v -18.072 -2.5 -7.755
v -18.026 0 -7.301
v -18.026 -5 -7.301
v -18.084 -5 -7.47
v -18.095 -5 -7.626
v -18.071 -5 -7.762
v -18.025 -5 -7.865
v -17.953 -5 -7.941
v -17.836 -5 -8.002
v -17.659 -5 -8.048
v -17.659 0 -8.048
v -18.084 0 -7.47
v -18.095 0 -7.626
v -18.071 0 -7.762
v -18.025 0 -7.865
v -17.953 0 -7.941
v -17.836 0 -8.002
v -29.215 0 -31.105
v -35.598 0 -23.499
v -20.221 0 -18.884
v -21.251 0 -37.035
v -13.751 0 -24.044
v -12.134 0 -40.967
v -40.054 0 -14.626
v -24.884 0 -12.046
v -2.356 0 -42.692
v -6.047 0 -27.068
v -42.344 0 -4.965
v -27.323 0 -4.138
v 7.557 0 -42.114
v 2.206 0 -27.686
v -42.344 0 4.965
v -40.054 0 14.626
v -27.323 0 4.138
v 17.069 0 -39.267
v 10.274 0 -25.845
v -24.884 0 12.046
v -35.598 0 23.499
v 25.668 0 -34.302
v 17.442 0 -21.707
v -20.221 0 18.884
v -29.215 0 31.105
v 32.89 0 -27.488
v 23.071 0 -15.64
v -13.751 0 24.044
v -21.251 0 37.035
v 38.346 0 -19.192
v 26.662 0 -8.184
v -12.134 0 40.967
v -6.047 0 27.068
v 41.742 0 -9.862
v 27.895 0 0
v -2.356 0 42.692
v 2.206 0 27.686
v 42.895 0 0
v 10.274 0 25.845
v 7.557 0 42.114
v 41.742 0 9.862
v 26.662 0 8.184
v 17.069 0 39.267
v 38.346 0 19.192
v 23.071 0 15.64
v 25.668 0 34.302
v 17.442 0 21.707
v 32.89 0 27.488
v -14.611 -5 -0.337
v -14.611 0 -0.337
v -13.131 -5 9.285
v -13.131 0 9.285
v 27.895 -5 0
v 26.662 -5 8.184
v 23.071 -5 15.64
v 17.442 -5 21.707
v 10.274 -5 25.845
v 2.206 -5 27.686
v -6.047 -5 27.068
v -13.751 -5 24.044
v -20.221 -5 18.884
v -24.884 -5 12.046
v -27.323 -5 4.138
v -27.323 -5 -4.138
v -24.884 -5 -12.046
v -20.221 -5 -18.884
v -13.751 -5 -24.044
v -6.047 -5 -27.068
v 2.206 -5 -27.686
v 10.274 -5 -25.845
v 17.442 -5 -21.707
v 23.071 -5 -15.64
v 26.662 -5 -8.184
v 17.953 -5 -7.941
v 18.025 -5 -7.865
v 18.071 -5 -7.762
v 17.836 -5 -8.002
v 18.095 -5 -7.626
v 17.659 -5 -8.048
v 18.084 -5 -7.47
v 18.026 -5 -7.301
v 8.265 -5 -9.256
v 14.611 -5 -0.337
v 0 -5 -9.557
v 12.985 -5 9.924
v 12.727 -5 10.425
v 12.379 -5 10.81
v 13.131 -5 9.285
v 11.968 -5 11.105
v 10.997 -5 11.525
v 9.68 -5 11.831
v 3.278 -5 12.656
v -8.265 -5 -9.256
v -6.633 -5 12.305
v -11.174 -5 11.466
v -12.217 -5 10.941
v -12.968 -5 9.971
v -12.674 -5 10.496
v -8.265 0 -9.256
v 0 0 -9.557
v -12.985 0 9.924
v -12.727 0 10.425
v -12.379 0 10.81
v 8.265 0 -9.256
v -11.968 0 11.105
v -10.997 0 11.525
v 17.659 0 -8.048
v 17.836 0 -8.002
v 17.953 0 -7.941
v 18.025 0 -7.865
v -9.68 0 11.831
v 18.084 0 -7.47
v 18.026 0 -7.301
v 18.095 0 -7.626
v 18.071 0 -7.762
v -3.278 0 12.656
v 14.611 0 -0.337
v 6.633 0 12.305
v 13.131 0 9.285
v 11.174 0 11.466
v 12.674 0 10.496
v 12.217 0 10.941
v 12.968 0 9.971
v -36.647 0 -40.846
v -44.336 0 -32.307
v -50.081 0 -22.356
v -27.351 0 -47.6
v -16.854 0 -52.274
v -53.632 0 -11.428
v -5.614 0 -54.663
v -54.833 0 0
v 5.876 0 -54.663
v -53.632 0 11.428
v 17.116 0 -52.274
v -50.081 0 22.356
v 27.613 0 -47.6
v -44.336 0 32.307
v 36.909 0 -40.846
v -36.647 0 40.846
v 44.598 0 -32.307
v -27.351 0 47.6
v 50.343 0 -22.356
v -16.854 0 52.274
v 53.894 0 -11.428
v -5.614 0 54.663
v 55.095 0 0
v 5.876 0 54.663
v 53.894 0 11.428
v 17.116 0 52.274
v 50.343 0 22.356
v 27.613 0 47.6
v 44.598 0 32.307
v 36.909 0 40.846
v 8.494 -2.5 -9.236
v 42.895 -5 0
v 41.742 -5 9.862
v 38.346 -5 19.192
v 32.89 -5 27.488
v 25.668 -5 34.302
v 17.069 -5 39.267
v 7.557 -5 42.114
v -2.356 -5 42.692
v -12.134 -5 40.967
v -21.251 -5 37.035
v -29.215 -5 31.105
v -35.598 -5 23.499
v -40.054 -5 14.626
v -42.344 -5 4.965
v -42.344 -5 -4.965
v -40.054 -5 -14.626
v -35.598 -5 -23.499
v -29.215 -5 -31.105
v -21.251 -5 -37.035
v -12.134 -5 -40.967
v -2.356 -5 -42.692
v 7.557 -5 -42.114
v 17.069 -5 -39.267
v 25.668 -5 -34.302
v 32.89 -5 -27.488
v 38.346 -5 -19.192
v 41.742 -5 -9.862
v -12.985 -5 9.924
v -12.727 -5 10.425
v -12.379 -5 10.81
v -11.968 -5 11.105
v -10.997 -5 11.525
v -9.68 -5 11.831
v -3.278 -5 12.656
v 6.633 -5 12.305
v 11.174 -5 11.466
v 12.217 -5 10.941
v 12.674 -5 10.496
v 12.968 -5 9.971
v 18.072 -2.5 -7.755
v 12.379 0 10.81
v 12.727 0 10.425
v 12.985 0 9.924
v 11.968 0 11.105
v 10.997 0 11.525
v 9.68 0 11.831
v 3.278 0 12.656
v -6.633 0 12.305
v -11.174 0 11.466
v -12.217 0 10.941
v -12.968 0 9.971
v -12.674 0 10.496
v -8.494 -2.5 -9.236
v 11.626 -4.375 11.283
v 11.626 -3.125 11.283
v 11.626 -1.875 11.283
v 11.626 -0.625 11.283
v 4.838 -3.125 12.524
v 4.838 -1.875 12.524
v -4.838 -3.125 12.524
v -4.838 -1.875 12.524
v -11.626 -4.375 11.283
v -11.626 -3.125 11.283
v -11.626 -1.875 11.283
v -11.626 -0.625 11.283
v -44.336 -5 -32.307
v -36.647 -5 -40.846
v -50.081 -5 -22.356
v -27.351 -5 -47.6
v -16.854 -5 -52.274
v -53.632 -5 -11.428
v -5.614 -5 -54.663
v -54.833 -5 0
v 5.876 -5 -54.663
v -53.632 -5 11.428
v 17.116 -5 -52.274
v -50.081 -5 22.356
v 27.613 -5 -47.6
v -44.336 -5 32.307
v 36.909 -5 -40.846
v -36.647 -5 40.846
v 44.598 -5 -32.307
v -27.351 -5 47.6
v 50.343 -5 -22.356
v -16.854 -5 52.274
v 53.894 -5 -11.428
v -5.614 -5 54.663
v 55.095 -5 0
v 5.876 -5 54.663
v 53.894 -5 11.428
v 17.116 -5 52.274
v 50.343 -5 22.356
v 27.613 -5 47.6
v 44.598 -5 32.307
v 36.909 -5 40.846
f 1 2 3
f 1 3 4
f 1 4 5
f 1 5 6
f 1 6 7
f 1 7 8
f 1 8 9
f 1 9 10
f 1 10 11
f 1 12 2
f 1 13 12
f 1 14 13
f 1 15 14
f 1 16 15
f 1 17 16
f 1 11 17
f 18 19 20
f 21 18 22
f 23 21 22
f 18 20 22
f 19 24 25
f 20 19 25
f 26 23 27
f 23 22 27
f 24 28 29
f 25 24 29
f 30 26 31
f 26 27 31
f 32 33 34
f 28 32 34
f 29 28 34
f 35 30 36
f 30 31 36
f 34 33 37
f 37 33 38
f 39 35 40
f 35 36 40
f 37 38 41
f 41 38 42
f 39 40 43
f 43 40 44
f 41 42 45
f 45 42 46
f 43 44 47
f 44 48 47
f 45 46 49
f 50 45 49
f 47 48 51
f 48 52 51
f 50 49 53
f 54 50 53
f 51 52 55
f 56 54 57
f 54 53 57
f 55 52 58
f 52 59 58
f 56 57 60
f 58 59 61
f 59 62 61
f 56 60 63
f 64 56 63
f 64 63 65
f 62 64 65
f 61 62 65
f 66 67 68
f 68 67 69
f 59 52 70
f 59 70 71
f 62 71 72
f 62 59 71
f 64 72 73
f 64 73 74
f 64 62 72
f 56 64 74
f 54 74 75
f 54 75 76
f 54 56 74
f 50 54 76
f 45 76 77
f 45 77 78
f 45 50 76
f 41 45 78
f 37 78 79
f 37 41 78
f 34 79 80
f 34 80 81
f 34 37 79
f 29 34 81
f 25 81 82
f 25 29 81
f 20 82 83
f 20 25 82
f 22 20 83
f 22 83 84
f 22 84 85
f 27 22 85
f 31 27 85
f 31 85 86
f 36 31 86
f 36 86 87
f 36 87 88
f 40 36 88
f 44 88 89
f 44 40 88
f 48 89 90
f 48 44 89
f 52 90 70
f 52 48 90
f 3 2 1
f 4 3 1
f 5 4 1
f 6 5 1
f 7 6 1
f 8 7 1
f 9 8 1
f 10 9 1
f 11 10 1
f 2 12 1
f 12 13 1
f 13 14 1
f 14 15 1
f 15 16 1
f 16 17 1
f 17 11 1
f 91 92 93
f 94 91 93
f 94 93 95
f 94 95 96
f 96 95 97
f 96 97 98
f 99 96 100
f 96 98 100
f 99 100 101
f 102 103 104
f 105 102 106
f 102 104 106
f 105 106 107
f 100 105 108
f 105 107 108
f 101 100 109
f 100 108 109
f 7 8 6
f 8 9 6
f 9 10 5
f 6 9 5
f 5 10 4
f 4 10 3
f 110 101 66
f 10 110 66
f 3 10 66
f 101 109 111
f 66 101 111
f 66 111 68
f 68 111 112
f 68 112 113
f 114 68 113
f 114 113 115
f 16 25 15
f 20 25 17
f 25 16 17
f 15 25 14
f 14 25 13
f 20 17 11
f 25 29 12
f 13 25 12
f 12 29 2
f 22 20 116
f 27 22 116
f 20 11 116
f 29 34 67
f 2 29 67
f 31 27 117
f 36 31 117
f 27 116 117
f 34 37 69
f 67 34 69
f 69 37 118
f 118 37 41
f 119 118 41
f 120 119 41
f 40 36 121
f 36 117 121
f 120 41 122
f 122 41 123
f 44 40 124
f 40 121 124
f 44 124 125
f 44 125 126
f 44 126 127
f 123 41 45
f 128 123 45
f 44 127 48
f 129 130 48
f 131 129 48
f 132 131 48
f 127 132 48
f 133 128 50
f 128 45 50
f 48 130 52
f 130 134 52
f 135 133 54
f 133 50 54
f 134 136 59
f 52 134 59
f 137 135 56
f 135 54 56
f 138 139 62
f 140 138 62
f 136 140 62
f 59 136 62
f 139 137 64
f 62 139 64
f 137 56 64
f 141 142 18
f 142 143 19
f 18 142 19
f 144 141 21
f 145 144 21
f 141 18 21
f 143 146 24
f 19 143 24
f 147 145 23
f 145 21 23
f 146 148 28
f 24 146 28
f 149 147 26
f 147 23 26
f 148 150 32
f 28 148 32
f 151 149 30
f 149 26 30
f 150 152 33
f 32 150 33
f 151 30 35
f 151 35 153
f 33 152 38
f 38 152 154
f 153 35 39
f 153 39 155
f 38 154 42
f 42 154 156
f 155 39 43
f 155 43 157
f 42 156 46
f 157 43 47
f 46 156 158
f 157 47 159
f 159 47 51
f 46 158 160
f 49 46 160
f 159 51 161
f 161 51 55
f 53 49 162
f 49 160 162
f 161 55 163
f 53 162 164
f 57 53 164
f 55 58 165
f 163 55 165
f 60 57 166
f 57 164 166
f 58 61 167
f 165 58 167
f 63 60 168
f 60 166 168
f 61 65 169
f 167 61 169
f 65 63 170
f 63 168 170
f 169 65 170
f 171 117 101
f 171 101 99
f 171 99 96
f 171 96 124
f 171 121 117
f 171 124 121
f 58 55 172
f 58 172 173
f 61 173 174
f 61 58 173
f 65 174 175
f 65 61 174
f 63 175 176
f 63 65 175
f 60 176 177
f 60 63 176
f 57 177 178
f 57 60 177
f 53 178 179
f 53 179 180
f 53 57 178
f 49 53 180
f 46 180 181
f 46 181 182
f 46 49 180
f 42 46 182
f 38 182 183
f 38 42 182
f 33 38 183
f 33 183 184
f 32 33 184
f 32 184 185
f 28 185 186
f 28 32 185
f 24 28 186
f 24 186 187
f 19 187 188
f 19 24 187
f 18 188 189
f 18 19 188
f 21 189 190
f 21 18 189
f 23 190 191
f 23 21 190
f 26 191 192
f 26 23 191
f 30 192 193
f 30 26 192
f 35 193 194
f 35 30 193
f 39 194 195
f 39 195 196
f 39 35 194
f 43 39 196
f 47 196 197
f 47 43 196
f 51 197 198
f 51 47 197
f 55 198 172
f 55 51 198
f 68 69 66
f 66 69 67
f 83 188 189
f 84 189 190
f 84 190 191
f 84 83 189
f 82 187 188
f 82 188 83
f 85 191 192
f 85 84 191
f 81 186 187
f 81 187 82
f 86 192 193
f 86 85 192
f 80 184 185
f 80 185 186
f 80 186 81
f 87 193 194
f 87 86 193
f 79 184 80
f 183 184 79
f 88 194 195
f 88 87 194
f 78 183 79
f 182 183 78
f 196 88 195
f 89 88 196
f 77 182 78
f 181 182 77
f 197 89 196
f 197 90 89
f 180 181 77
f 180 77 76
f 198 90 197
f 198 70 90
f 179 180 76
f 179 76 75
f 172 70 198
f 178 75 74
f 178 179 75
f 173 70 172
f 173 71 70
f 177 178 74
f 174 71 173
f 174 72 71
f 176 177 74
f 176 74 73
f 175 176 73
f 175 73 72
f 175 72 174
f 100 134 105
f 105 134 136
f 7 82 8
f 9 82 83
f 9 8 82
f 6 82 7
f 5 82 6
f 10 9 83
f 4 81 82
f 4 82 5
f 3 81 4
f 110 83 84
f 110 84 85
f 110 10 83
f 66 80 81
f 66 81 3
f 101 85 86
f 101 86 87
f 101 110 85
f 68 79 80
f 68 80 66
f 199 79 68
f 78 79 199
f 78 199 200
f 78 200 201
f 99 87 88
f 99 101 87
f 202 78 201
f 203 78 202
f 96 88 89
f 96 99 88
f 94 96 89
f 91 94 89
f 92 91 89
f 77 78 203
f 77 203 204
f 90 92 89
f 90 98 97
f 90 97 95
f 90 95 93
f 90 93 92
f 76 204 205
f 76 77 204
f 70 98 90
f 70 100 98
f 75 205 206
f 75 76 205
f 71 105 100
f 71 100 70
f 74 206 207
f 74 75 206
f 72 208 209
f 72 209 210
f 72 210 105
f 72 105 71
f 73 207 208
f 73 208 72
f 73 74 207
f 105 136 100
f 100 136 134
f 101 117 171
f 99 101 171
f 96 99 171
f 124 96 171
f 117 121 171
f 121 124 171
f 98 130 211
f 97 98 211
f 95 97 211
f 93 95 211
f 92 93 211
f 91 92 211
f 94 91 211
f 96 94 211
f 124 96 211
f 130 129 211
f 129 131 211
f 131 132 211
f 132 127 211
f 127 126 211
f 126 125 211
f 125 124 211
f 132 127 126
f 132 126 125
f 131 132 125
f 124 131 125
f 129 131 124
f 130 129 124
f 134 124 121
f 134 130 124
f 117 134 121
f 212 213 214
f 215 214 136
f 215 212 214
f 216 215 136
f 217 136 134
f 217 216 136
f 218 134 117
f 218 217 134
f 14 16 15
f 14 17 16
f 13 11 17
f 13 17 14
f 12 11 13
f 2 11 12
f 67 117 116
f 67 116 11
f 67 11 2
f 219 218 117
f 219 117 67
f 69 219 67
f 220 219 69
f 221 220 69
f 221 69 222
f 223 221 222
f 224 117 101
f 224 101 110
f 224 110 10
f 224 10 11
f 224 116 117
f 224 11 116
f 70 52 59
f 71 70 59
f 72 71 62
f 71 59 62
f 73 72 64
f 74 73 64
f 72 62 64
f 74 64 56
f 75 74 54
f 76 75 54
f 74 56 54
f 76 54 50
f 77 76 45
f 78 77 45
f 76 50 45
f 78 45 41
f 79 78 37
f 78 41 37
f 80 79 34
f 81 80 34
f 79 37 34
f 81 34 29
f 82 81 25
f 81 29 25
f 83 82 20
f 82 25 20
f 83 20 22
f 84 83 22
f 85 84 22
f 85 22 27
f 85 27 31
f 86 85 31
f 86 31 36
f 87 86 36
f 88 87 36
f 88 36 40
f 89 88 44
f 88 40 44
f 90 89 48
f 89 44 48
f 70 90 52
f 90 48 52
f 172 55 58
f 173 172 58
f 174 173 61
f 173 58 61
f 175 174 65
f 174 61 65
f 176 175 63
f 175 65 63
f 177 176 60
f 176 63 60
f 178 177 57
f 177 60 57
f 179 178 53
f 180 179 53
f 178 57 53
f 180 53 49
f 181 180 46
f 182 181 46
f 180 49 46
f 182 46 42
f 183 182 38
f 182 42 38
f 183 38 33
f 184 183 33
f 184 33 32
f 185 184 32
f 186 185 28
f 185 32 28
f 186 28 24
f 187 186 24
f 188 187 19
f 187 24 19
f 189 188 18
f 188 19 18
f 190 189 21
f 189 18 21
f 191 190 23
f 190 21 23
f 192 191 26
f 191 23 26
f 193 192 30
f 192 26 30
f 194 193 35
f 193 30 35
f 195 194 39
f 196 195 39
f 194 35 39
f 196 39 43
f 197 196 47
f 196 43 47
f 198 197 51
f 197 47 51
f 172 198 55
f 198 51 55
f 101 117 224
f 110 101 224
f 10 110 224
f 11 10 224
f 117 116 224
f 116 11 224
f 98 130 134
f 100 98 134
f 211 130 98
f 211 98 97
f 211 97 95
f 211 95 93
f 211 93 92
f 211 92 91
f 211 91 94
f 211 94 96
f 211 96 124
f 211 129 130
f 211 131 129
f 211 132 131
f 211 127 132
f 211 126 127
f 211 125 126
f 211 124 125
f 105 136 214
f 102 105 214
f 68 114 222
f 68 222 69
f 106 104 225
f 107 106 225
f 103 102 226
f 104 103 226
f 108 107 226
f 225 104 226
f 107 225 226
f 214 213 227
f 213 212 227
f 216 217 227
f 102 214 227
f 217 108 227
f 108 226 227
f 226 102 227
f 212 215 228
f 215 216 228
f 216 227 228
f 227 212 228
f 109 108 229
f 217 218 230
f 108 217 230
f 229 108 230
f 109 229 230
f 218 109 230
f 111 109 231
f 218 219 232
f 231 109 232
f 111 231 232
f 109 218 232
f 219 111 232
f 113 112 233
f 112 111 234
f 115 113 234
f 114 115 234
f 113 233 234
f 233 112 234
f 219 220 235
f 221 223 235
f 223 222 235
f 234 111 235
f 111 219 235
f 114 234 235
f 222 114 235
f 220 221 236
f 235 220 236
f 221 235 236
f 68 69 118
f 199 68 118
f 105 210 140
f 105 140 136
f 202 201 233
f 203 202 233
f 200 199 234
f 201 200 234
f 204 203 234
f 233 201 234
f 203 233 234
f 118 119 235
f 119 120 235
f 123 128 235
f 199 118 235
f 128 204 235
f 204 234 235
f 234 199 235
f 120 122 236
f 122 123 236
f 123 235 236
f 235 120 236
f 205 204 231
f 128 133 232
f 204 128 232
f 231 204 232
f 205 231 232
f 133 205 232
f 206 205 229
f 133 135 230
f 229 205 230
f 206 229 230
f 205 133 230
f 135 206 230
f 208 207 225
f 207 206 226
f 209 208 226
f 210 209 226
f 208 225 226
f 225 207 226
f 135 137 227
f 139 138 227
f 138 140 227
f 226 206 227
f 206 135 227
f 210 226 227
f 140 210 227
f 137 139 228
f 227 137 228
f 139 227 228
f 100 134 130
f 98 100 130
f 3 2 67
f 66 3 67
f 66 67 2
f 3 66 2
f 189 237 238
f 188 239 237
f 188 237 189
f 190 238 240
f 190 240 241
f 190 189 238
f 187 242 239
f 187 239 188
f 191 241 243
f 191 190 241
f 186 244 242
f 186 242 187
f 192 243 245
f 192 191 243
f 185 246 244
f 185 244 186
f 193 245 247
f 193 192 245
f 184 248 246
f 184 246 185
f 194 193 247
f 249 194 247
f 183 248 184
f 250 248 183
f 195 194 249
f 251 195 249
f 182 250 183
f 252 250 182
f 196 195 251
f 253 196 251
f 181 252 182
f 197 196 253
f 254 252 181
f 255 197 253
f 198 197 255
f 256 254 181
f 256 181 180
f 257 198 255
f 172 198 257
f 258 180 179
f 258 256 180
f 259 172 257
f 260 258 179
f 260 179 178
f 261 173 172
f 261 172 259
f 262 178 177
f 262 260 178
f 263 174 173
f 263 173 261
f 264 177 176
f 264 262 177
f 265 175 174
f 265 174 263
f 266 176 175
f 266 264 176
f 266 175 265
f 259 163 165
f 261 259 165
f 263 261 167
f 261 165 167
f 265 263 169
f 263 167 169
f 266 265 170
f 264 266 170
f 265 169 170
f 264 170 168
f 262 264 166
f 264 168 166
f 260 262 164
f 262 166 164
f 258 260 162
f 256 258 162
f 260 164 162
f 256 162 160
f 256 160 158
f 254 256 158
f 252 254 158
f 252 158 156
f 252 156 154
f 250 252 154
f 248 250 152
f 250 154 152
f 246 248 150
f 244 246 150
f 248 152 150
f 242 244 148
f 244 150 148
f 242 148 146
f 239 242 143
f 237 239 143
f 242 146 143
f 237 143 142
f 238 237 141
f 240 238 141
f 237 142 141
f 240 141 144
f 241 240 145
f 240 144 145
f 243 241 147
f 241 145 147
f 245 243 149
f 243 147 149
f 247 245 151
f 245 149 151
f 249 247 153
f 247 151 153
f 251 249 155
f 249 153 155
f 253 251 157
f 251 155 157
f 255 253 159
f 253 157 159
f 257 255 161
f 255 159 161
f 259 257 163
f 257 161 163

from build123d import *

# Parameters (mm, degrees)
F1_DEPTH = 5
F0_R     = 27.763995
F2_DEPTH = 5
F0_R_2   = 42.763995
F3_DEPTH = 5
F0_R_3   = 54.963995
F4_DEPTH = 5


with BuildPart() as f1:
    # F0 (on Front) → F1 (new body)
    with BuildSketch(Plane.XZ):
        with BuildLine():
            add(Edge.make_bspline(
                [(0, 12.749238871), (1.8799504391, 12.749238871), (4.6468677574, 12.621967018), (9.0016043625, 11.9592161022), (11.6822012955, 11.487029525), (13.0032659097, 10.4224192532), (13.1307793781, 9.2846127227)],
                knots=[0, 0, 0, 0, 0.2944379035, 0.5705931421, 0.7883897291, 1, 1, 1, 1], degree=3))
            add(Edge.make_bspline(
                [(0, 12.749238871), (-1.8799504391, 12.749238871), (-4.6468677574, 12.621967018), (-9.0016043625, 11.9592161022), (-11.6822012955, 11.487029525), (-13.0032659097, 10.4224192532), (-13.1307793781, 9.2846127227)],
                knots=[0, 0, 0, 0, 0.2944379035, 0.5705931421, 0.7883897291, 1, 1, 1, 1], degree=3))
            Line((-13.1307793781, 9.2846127227), (-14.6110216156, -0.3369693877))
            Line((-14.6110216156, -0.3369693877), (-18.0258862674, -7.3006520979))
            add(Edge.make_bspline(
                [(-18.0258862674, -7.3006520979), (-18.1105896685, -7.4722460504), (-18.105776428, -7.7897039819), (-17.9599132375, -7.9946665401), (-17.6592595211, -8.0481836141)],
                knots=[0, 0, 0, 0, 0.4869255089, 1, 1, 1, 1], degree=3))
            add(Edge.make_bspline(
                [(0, -9.556960276), (-2.6989814748, -9.5360273975), (-7.5647477911, -9.5064457404), (-14.5901364303, -8.531159682), (-17.6592595211, -8.0481836141)],
                knots=[0, 0, 0, 0, 0.4488909251, 0.842960095, 0.842960095, 0.842960095, 0.842960095], degree=3))
            add(Edge.make_bspline(
                [(0, -9.556960276), (2.6989814748, -9.5360273975), (7.5647477911, -9.5064457404), (14.5901364303, -8.531159682), (17.6592595211, -8.0481836141)],
                knots=[0, 0, 0, 0, 0.4488909251, 0.842960095, 0.842960095, 0.842960095, 0.842960095], degree=3))
            add(Edge.make_bspline(
                [(18.0258862674, -7.3006520979), (18.1105896685, -7.4722460504), (18.105776428, -7.7897039819), (17.9599132375, -7.9946665401), (17.6592595211, -8.0481836141)],
                knots=[0, 0, 0, 0, 0.4869255089, 1, 1, 1, 1], degree=3))
            Line((18.0258862674, -7.3006520979), (14.6110216156, -0.3369693877))
            Line((14.6110216156, -0.3369693877), (13.1307793781, 9.2846127227))
        make_face()
    extrude(amount=F1_DEPTH)


with BuildPart() as f2:
    # F0 (on Front) → F2 (new body)
    with BuildSketch(Plane.XZ):
        with Locations((0.1309880681, 0)):
            Circle(F0_R)
        with BuildLine():
            add(Edge.make_bspline(
                [(0, 12.749238871), (-1.8799504391, 12.749238871), (-4.6468677574, 12.621967018), (-9.0016043625, 11.9592161022), (-11.6822012955, 11.487029525), (-13.0032659097, 10.4224192532), (-13.1307793781, 9.2846127227)],
                knots=[0, 0, 0, 0, 0.2944379035, 0.5705931421, 0.7883897291, 1, 1, 1, 1], degree=3))
            add(Edge.make_bspline(
                [(0, 12.749238871), (1.8799504391, 12.749238871), (4.6468677574, 12.621967018), (9.0016043625, 11.9592161022), (11.6822012955, 11.487029525), (13.0032659097, 10.4224192532), (13.1307793781, 9.2846127227)],
                knots=[0, 0, 0, 0, 0.2944379035, 0.5705931421, 0.7883897291, 1, 1, 1, 1], degree=3))
            Line((13.1307793781, 9.2846127227), (14.6110216156, -0.3369693877))
            Line((14.6110216156, -0.3369693877), (18.0258862674, -7.3006520979))
            add(Edge.make_bspline(
                [(18.0258862674, -7.3006520979), (18.1105896685, -7.4722460504), (18.105776428, -7.7897039819), (17.9599132375, -7.9946665401), (17.6592595211, -8.0481836141)],
                knots=[0, 0, 0, 0, 0.4869255089, 1, 1, 1, 1], degree=3))
            add(Edge.make_bspline(
                [(0, -9.556960276), (2.6989814748, -9.5360273975), (7.5647477911, -9.5064457404), (14.5901364303, -8.531159682), (17.6592595211, -8.0481836141)],
                knots=[0, 0, 0, 0, 0.4488909251, 0.842960095, 0.842960095, 0.842960095, 0.842960095], degree=3))
            add(Edge.make_bspline(
                [(0, -9.556960276), (-2.6989814748, -9.5360273975), (-7.5647477911, -9.5064457404), (-14.5901364303, -8.531159682), (-17.6592595211, -8.0481836141)],
                knots=[0, 0, 0, 0, 0.4488909251, 0.842960095, 0.842960095, 0.842960095, 0.842960095], degree=3))
            add(Edge.make_bspline(
                [(-18.0258862674, -7.3006520979), (-18.1105896685, -7.4722460504), (-18.105776428, -7.7897039819), (-17.9599132375, -7.9946665401), (-17.6592595211, -8.0481836141)],
                knots=[0, 0, 0, 0, 0.4869255089, 1, 1, 1, 1], degree=3))
            Line((-18.0258862674, -7.3006520979), (-14.6110216156, -0.3369693877))
            Line((-14.6110216156, -0.3369693877), (-13.1307793781, 9.2846127227))
        make_face(mode=Mode.SUBTRACT)
    extrude(amount=F2_DEPTH)


with BuildPart() as f3:
    # F0 (on Front) → F3 (new body)
    with BuildSketch(Plane.XZ):
        with Locations((0.1309880681, 0)):
            Circle(F0_R_2)
        with Locations((0.1309880681, 0)):
            Circle(F0_R, mode=Mode.SUBTRACT)
    extrude(amount=F3_DEPTH)


with BuildPart() as f4:
    # F0 (on Front) → F4 (new body)
    with BuildSketch(Plane.XZ):
        with Locations((0.1309880681, 0)):
            Circle(F0_R_3)
        with Locations((0.1309880681, 0)):
            Circle(F0_R_2, mode=Mode.SUBTRACT)
    extrude(amount=F4_DEPTH)


solid = Compound([f1.part, f2.part, f3.part, f4.part])
